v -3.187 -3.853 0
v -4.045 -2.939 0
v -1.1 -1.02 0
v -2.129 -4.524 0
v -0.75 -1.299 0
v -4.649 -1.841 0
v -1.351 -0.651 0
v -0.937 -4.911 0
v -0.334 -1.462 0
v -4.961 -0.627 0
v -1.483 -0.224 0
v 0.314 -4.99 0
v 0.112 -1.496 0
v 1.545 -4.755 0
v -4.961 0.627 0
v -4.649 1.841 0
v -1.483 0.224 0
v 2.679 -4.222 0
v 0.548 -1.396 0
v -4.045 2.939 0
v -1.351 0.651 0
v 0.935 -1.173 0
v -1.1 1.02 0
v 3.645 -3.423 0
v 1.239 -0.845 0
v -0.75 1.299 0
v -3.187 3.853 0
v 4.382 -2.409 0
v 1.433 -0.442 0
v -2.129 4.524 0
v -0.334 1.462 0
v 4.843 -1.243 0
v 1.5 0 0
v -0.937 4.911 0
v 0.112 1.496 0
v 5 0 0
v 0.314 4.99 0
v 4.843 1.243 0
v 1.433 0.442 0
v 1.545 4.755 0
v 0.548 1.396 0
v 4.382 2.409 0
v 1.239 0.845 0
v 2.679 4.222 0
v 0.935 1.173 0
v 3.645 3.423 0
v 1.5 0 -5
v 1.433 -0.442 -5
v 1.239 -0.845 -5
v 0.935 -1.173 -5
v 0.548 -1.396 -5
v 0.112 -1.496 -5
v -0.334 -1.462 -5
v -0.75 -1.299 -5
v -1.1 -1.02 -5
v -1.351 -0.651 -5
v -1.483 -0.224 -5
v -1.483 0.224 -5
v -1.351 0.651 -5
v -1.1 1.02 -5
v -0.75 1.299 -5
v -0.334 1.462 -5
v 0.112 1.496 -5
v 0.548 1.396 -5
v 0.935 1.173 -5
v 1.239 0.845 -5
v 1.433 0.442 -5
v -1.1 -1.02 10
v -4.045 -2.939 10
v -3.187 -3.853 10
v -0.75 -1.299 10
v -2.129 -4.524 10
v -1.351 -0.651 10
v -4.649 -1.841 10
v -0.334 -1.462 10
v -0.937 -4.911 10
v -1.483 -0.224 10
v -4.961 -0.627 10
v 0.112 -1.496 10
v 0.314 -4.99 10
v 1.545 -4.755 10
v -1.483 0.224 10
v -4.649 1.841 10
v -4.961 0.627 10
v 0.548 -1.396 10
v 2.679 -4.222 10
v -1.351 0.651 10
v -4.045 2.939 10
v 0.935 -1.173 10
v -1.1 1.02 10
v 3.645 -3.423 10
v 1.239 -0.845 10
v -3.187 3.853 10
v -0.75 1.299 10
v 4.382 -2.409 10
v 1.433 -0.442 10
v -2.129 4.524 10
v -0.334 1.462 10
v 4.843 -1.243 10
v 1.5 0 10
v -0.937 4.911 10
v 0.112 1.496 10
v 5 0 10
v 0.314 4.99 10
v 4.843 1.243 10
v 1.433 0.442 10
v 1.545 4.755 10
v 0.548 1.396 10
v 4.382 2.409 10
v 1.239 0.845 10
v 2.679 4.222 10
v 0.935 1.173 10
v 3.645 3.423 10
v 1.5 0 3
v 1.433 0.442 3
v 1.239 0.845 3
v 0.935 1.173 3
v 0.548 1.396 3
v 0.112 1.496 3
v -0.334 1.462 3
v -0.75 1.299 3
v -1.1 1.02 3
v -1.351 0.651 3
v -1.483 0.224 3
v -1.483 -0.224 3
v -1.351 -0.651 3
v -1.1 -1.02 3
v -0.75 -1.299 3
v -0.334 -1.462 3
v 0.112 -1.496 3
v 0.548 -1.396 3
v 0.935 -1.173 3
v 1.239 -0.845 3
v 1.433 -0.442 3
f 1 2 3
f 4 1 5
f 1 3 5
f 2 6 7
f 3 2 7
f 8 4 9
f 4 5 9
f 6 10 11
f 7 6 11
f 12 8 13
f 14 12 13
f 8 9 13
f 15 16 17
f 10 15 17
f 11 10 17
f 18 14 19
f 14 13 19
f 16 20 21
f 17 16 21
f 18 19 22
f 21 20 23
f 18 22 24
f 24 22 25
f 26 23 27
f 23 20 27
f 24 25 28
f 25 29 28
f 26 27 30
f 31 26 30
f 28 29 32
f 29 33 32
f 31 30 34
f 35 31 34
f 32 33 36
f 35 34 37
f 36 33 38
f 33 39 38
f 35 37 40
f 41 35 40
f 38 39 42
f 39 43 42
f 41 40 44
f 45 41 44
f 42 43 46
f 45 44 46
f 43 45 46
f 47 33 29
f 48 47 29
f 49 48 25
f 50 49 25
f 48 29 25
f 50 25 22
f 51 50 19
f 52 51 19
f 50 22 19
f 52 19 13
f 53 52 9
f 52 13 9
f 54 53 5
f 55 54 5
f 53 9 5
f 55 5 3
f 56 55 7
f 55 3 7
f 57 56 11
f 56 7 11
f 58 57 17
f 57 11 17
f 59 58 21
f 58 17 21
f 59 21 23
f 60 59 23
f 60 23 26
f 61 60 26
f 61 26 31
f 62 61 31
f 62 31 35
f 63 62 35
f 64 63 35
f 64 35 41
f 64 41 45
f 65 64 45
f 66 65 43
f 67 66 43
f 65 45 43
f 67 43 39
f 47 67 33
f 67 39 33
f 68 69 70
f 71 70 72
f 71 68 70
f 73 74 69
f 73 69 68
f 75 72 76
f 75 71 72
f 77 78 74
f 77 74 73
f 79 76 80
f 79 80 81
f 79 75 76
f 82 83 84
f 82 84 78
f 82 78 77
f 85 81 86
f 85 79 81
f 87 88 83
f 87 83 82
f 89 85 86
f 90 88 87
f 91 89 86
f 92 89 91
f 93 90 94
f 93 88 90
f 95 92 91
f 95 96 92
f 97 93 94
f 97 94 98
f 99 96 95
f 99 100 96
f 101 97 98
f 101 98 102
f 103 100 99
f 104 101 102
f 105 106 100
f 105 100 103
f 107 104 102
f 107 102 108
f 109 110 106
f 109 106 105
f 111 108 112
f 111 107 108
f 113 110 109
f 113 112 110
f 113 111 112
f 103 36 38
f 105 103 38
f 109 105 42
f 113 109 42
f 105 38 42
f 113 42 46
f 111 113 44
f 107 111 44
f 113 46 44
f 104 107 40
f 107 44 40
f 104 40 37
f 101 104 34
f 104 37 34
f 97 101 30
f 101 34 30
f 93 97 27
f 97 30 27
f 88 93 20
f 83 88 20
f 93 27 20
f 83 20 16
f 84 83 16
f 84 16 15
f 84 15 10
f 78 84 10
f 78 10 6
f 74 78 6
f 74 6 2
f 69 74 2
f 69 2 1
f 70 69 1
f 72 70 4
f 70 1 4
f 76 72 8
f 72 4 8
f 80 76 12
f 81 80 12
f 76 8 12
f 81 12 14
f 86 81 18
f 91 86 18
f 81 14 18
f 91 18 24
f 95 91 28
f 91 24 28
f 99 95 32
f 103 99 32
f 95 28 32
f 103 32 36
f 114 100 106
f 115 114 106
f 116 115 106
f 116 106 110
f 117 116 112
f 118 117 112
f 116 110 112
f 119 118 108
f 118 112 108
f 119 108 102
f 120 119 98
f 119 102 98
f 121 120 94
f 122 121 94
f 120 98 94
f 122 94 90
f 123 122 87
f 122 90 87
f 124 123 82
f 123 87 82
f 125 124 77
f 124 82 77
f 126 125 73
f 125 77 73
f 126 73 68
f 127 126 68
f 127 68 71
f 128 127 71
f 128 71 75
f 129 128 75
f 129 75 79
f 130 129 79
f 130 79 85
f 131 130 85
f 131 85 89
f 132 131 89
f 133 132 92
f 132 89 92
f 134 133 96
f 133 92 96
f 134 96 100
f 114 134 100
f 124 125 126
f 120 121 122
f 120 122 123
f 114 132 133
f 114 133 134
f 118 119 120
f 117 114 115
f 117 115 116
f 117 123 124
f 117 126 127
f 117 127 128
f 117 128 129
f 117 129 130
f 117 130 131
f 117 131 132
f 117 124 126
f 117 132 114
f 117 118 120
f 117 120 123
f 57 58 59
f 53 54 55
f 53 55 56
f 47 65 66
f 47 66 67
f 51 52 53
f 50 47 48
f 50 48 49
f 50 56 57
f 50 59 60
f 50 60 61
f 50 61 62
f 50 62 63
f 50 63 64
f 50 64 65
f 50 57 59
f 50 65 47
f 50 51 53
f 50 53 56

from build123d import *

# Parameters (mm, degrees)
F0_R     = 5
F1_DEPTH = 10
F2_R     = 1.5
F3_DEPTH = 7
F4_R     = 1.5
F5_DEPTH = 5


with BuildPart() as f1:
    # F0 (on Top) → F1 (new body)
    with BuildSketch(Plane.XY):
        Circle(F0_R)
    extrude(amount=F1_DEPTH)

    # F2 (on face) → F3 (cut)
    with BuildSketch(Plane.XY.offset(10)):
        Circle(F2_R)
    extrude(amount=-F3_DEPTH, mode=Mode.SUBTRACT)

    # F4 (on face) → F5 (join)
    with BuildSketch(Plane(origin=(0, 0, 0), x_dir=(1, 0, 0), z_dir=(0, 0, -1))):
        Circle(F4_R)
    extrude(amount=F5_DEPTH)


solid = f1.part
